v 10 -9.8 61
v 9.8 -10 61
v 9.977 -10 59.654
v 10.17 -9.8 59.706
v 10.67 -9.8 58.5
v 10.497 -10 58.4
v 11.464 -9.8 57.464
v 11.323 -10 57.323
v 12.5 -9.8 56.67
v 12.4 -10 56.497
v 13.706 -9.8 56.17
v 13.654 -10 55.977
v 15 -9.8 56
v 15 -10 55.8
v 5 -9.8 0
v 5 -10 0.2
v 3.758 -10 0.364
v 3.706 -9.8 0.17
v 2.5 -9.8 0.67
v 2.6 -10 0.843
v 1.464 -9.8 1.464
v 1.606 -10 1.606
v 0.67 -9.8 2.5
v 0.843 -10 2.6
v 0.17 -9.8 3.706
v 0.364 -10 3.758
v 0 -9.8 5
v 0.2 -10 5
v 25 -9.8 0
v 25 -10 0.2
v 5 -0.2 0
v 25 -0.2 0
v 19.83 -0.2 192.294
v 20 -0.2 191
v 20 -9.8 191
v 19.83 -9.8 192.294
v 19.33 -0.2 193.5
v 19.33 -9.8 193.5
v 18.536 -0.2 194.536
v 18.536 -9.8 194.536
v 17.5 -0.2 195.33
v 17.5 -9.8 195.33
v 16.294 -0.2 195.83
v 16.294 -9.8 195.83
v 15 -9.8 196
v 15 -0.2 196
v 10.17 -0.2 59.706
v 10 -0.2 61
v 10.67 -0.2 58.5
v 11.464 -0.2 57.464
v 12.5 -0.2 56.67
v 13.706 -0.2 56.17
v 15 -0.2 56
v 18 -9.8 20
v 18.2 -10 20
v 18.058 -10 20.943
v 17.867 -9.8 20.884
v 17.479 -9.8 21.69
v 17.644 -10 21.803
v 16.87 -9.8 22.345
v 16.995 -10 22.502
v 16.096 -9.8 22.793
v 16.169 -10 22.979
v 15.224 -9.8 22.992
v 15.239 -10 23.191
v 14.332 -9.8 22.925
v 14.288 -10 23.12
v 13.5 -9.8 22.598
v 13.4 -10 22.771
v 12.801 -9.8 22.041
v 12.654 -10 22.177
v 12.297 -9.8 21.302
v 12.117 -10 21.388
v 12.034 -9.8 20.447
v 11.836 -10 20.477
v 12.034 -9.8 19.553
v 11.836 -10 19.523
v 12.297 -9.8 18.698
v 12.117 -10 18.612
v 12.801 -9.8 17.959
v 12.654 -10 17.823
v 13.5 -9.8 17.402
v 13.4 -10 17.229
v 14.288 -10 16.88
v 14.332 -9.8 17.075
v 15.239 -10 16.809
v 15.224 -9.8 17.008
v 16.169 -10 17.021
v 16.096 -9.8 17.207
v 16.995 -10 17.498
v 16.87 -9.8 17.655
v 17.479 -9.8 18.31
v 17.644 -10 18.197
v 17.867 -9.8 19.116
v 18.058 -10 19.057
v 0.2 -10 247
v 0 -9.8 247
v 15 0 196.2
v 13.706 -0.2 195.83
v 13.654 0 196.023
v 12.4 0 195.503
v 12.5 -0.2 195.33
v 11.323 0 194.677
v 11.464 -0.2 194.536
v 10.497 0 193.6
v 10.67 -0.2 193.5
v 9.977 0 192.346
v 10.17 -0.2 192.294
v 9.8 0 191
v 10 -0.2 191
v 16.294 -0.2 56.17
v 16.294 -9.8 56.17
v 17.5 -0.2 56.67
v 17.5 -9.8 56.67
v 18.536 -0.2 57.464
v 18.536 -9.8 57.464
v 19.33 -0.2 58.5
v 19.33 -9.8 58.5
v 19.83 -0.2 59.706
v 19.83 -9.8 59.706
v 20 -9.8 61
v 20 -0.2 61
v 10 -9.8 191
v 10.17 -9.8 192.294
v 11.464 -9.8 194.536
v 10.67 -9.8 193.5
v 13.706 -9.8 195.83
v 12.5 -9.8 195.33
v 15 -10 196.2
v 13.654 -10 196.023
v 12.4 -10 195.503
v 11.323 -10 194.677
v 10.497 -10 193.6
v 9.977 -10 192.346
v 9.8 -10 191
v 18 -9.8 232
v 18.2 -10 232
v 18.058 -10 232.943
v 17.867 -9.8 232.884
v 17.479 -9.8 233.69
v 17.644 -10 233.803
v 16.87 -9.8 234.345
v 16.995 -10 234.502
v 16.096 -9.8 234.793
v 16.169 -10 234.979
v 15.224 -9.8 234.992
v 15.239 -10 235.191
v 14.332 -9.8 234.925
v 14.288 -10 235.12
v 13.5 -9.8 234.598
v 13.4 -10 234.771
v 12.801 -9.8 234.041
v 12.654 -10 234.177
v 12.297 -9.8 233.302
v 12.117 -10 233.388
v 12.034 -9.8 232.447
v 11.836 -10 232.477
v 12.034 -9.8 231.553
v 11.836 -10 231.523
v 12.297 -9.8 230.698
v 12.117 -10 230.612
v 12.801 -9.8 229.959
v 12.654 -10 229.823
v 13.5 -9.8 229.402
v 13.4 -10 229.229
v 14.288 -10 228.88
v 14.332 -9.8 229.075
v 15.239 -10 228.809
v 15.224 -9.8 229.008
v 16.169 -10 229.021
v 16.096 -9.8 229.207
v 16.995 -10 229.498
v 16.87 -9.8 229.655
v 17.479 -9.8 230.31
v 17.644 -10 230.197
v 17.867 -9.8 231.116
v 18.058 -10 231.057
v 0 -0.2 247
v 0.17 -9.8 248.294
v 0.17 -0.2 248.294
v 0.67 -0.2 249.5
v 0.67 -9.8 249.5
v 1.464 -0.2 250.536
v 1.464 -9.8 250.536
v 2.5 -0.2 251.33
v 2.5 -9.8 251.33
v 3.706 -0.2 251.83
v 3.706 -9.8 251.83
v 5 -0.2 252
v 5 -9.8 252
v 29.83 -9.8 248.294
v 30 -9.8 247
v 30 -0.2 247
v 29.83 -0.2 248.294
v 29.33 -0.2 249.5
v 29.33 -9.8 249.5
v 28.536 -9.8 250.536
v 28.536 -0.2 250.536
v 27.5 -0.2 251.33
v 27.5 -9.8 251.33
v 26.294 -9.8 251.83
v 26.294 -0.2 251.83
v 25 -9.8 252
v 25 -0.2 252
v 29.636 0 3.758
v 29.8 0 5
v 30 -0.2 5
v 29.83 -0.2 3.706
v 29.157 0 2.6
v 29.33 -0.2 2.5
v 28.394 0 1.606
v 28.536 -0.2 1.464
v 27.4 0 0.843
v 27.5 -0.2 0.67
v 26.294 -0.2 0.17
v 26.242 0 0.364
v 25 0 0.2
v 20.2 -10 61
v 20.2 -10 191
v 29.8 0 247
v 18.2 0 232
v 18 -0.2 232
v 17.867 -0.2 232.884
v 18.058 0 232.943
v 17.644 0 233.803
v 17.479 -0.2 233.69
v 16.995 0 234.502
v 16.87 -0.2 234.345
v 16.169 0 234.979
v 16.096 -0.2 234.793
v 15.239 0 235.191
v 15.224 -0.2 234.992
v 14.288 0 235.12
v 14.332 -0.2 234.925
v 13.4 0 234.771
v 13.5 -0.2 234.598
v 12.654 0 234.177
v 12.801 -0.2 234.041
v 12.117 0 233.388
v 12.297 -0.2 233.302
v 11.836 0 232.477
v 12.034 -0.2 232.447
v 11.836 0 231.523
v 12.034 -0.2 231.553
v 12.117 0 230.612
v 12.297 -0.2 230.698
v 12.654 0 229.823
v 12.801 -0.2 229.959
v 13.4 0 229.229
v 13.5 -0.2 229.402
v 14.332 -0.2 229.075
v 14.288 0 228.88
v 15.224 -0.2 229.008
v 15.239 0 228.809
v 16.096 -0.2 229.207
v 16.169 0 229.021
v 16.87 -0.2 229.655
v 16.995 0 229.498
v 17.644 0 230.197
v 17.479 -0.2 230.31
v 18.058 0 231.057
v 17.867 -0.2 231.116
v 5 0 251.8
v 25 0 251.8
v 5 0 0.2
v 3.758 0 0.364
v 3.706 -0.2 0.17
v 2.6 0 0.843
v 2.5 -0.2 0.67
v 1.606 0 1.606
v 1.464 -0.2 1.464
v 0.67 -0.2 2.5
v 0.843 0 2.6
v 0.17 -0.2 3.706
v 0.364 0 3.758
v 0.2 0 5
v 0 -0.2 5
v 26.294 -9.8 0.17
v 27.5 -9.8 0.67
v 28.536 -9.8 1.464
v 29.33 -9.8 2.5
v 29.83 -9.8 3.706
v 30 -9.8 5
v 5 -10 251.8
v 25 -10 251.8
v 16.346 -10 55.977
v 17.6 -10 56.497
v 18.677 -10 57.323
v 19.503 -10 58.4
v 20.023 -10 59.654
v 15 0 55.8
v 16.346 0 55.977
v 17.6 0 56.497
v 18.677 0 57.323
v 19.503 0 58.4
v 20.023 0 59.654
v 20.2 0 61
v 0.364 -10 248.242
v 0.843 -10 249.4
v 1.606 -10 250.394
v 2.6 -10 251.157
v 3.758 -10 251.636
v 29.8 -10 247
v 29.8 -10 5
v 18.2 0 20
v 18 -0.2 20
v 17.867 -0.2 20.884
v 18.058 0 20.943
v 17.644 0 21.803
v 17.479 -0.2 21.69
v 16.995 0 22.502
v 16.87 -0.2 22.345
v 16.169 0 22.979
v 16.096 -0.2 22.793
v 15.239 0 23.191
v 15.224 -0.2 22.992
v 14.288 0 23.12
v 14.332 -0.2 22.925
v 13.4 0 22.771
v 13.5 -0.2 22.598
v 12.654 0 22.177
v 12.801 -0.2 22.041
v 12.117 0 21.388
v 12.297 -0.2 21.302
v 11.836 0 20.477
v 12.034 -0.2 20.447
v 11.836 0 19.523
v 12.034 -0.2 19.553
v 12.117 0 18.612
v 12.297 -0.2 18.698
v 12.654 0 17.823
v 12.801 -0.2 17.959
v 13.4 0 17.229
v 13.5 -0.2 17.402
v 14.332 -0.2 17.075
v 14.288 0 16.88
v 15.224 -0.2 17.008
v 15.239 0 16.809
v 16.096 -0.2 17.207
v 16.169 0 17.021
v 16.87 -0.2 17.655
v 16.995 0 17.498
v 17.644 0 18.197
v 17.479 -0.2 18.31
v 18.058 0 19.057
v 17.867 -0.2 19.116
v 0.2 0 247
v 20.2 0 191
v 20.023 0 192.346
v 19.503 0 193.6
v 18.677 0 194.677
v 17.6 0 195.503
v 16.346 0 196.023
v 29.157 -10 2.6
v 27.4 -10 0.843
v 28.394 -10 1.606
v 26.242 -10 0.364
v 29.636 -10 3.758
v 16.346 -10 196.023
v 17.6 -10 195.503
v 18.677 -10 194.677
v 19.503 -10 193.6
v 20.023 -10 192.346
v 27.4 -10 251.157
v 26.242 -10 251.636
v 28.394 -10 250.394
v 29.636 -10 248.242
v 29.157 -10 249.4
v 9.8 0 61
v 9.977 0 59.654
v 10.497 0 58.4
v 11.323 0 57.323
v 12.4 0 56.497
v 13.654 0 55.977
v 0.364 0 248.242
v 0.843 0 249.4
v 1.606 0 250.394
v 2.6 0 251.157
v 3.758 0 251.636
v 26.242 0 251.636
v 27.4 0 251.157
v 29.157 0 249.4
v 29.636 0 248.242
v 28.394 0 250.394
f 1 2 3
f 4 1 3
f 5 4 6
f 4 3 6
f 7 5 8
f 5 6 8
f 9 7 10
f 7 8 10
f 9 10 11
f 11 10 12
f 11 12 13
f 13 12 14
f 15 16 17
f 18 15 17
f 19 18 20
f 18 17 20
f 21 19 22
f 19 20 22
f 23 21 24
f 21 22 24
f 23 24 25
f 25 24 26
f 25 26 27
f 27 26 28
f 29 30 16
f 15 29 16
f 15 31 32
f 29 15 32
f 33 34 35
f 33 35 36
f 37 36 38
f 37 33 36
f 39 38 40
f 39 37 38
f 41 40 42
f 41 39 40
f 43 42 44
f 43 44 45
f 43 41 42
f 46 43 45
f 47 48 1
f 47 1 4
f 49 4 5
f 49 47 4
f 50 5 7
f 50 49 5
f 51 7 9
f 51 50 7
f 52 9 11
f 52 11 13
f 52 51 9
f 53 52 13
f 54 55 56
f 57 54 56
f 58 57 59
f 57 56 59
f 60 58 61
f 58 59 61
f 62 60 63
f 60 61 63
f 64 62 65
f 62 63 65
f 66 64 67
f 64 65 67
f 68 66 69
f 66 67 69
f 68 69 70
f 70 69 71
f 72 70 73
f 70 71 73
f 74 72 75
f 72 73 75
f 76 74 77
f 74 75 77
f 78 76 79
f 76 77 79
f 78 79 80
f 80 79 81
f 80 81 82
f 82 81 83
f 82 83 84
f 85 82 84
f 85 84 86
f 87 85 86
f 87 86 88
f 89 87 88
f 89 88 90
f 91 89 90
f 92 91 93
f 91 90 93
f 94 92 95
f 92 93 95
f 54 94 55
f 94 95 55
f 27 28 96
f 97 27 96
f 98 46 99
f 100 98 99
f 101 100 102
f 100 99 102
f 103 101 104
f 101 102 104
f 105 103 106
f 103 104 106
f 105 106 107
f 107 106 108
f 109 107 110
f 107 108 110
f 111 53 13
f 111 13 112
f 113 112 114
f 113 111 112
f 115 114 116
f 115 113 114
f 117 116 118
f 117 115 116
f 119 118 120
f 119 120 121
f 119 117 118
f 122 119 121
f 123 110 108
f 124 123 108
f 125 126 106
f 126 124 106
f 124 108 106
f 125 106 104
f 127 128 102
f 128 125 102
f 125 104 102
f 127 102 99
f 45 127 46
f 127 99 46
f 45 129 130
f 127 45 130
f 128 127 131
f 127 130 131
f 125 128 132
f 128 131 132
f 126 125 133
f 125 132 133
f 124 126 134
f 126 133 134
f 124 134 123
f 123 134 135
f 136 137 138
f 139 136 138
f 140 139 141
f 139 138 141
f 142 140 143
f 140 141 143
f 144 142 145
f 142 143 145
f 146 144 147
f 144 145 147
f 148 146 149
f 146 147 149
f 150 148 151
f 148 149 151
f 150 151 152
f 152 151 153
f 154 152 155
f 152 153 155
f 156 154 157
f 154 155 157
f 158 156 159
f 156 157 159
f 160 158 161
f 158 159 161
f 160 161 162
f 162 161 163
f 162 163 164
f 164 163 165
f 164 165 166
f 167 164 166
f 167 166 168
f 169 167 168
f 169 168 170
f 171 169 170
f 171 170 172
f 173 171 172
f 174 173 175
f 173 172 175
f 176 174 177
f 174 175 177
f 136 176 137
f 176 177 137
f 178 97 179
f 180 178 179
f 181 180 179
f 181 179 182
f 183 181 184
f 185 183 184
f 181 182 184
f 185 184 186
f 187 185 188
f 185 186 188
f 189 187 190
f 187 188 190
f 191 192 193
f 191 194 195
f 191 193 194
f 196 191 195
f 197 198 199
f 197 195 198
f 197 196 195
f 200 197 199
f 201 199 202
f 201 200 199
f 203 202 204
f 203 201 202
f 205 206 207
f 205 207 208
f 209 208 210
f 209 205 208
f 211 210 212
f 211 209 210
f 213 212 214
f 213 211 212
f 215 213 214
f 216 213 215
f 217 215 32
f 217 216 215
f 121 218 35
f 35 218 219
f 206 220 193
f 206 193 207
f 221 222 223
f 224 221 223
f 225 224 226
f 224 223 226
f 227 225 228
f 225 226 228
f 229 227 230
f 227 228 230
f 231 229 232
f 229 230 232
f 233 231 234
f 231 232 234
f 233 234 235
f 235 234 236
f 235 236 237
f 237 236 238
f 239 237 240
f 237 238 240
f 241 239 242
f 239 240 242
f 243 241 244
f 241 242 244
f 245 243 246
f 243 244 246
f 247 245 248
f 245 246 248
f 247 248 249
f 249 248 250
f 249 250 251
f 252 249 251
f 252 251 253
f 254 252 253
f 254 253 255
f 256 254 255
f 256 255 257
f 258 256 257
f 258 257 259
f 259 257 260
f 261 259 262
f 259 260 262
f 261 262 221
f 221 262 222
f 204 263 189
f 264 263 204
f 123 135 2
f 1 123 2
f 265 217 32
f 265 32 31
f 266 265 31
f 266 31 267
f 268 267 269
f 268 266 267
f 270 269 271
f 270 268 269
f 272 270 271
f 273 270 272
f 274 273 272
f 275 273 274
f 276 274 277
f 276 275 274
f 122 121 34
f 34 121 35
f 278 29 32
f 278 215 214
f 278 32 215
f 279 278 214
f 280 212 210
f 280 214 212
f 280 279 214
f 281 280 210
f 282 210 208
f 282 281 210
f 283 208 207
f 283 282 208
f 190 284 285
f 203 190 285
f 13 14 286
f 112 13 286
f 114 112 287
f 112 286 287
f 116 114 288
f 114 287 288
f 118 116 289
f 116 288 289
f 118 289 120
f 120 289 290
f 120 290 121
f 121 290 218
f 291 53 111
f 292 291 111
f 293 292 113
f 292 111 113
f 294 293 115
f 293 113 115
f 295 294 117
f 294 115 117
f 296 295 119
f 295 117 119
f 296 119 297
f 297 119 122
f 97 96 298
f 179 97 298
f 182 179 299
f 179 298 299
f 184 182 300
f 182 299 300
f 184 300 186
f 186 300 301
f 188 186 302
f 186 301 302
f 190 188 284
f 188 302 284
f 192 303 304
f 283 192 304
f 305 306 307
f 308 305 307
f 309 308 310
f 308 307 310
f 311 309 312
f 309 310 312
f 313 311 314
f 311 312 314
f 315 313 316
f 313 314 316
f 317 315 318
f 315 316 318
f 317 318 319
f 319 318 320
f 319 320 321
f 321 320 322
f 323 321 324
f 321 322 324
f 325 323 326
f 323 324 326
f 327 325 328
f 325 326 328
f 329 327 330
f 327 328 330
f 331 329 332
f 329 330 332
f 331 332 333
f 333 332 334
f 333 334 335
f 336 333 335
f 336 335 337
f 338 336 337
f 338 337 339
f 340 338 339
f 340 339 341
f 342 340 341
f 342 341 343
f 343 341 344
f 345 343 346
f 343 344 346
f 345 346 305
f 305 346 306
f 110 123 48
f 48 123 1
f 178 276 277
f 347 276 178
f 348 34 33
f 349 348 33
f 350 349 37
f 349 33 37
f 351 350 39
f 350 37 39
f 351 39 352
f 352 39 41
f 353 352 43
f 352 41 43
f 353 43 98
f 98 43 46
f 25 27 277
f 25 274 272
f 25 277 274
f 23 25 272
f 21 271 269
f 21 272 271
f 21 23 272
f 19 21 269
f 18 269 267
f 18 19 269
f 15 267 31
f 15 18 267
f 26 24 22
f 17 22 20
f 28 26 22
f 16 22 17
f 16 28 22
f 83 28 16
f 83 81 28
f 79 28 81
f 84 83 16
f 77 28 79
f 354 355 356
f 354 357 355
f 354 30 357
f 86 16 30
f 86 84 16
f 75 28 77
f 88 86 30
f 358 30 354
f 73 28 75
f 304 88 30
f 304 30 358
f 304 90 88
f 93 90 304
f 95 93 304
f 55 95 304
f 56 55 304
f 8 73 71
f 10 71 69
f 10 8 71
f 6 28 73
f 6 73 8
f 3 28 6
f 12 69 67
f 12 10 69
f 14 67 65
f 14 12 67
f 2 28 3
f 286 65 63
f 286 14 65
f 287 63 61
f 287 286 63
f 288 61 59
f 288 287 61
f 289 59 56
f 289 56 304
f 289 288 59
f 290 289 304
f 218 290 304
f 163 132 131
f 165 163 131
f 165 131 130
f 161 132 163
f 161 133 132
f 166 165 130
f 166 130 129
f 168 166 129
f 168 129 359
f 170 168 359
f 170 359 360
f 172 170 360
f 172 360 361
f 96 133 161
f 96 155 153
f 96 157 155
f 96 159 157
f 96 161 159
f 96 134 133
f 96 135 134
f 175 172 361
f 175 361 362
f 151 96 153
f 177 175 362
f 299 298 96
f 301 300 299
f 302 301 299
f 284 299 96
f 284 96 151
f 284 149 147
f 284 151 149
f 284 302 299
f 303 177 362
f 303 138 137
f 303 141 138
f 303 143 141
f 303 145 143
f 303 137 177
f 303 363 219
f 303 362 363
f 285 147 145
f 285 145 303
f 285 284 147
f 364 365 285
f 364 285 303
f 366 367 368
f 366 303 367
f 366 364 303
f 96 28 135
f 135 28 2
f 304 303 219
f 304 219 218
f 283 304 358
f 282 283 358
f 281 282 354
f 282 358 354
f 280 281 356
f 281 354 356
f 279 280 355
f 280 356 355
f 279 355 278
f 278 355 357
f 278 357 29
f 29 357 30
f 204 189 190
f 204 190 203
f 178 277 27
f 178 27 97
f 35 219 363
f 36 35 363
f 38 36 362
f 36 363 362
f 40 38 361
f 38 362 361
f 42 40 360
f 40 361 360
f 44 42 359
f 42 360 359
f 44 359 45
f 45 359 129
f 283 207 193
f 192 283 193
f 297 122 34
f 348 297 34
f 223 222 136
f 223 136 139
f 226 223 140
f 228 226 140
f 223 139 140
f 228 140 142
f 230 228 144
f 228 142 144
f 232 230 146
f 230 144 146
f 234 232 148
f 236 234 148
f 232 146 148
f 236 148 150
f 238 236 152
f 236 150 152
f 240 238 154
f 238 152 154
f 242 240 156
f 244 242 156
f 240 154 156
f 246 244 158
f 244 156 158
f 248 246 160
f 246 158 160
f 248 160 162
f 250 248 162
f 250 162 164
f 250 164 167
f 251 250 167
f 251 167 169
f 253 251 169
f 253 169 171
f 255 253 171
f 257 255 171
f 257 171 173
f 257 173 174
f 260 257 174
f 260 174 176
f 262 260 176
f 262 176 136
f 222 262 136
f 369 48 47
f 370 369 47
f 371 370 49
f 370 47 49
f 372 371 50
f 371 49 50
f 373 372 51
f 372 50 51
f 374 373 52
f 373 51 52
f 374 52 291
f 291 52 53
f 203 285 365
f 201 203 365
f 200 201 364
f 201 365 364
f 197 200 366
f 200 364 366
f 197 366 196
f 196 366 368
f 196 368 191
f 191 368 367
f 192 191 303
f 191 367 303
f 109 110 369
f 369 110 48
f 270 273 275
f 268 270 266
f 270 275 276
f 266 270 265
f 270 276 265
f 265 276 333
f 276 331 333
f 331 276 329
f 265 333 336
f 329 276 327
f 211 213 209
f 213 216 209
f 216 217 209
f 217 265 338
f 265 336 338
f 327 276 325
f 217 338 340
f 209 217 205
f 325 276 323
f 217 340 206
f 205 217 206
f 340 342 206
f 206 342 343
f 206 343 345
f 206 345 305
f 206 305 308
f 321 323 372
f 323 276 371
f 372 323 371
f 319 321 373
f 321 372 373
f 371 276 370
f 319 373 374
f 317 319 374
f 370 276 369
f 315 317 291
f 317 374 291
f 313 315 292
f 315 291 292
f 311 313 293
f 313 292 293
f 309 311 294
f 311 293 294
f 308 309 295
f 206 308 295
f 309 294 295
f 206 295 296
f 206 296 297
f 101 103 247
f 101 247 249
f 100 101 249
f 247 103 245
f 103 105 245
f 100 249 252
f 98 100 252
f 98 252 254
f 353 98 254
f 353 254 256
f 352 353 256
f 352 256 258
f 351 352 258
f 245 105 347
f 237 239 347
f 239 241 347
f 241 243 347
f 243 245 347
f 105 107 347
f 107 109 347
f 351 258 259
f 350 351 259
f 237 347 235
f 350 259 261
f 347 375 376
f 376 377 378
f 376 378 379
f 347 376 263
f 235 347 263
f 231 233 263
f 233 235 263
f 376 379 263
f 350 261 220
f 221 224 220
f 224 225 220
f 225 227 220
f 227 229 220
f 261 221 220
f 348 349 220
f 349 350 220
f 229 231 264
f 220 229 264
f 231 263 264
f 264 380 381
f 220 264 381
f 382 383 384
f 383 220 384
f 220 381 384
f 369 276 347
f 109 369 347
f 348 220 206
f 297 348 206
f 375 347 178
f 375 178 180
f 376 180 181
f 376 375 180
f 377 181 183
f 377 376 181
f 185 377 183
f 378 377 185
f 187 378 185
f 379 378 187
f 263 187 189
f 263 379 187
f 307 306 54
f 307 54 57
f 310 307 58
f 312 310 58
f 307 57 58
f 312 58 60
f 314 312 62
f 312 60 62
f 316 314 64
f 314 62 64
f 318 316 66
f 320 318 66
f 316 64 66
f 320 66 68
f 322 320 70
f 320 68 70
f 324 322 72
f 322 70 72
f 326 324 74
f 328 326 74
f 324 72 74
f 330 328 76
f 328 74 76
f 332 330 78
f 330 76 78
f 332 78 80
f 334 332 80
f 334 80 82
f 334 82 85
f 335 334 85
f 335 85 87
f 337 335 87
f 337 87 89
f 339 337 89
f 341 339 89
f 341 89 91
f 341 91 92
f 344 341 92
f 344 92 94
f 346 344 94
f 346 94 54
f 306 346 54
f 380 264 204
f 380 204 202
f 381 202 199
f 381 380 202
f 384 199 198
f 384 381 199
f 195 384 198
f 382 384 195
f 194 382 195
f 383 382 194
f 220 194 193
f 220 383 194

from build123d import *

# Parameters (mm, degrees)
F0_W     = 30
F0_H     = 252
F1_DEPTH = 10
F2_R     = 5
F4_DEPTH = 25
F5_R     = 4.99999
F6_R     = 3
F7_DEPTH = 25
F8_R     = 3
F9_DEPTH = 25
F10_SIZE = 0.2
F11_SIZE = 0.2


# Not quite as in the source:
# - a fillet or chamfer is up to 0.001 mm smaller than in the source, because OpenCascade refuses the exact size


with BuildPart() as f1:
    # F0 (on Front) → F1 (new body)
    with BuildSketch(Plane.XZ):
        with Locations((15, 126)):
            Rectangle(F0_W, F0_H)
    extrude(amount=F1_DEPTH)

    # F2
    f2_edges = [f1.edges().sort_by_distance(p)[0] for p in [
        (30, -5, 252),
        (0, -5, 252),
        (30, -5, 0),
        (0, -5, 0),
    ]]
    fillet(f2_edges, radius=F2_R)

    # F3 (on face) → F4 (cut)
    with BuildSketch(Plane.XZ.offset(10)):
        Polygon((10.0000001118, 196), (10.0000001118, 126), (10.0000001118, 56), (20, 56), (20, 126), (20, 196), align=None)
    extrude(amount=-F4_DEPTH, mode=Mode.SUBTRACT)

    # F5 (radius 5 in the source; OpenCascade refuses exactly that, so slightly less here)
    f5_edges = [f1.edges().sort_by_distance(p)[0] for p in [
        (10, -5, 196),
        (20, -5, 196),
        (20, -5, 56),
        (10, -5, 56),
    ]]
    fillet(f5_edges, radius=F5_R)

    # F6 (on face) → F7 (cut)
    with BuildSketch(Plane.XZ.offset(10)):
        with Locations((15, 232)):
            Circle(F6_R)
    extrude(amount=-F7_DEPTH, mode=Mode.SUBTRACT)

    # F8 (on face) → F9 (cut)
    with BuildSketch(Plane.XZ.offset(10)):
        with Locations((15, 20)):
            Circle(F8_R)
    extrude(amount=-F9_DEPTH, mode=Mode.SUBTRACT)

    # F10
    f10_edges = [f1.edges().sort_by_distance(p)[0] for p in [
        (0, -10, 126),
        (1.464466, -10, 250.535534),
        (1.464466, -10, 1.464466),
        (15, -10, 252),
        (15, -10, 0),
        (28.535534, -10, 250.535534),
        (28.535534, -10, 1.464466),
        (30, -10, 126),
        (12, -10, 20),
        (12, -10, 232),
        (15, -10, 56),
        (11.464463, -10, 57.464463),
        (18.535537, -10, 57.464463),
        (10, -10, 126),
        (20, -10, 126),
        (11.464463, -10, 194.535537),
        (18.535537, -10, 194.535537),
        (15, -10, 196),
    ]]
    chamfer(f10_edges, length=F10_SIZE)

    # F11
    f11_edges = [f1.edges().sort_by_distance(p)[0] for p in [
        (0, 0, 126),
        (1.464466, 0, 250.535534),
        (1.464466, 0, 1.464466),
        (15, 0, 252),
        (15, 0, 0),
        (28.535534, 0, 250.535534),
        (28.535534, 0, 1.464466),
        (30, 0, 126),
        (12, 0, 20),
        (12, 0, 232),
        (10, 0, 126),
        (11.464463, 0, 194.535537),
        (11.464463, 0, 57.464463),
        (15, 0, 196),
        (15, 0, 56),
        (18.535537, 0, 194.535537),
        (18.535537, 0, 57.464463),
        (20, 0, 126),
    ]]
    chamfer(f11_edges, length=F11_SIZE)


solid = f1.part
